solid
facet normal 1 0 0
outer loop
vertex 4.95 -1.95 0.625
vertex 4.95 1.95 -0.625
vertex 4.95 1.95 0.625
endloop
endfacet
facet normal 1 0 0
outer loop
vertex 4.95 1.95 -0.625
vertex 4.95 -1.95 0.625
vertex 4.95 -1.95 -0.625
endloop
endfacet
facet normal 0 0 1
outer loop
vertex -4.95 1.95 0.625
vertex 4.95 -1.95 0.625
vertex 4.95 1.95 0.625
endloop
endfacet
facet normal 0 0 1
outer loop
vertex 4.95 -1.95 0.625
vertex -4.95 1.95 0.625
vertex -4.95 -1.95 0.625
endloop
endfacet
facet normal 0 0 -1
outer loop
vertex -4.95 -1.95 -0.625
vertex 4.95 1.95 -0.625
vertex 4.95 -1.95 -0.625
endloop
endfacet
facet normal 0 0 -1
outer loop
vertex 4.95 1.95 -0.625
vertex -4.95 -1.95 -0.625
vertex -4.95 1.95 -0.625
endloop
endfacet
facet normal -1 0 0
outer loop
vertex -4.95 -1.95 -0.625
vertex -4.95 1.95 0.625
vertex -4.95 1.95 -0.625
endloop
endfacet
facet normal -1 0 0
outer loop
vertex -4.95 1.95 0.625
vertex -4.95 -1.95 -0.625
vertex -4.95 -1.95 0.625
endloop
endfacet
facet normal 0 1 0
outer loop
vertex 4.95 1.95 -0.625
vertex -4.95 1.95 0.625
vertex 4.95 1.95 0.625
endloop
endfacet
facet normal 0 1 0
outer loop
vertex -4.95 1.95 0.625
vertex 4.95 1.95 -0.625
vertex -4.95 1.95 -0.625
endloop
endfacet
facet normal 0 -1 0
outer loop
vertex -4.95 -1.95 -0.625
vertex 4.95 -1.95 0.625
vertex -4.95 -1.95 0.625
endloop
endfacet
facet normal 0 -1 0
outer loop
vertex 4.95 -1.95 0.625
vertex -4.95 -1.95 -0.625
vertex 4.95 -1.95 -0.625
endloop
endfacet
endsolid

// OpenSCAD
// Parameters
body_length = 9.9; //[5:20:0.1]
body_width = 3.9; //[2:8:0.1]
body_height = 1.25; //[0.6:2.5:0.05]
overlap = 0.8; //[0.5:2:0.1]
placeholder_thickness = 0.01; //[0.001:0.1:0.001]

// SMD Package
module smd_body() {
  color([0.85, 0.85, 0.8]) // Off-white for SMD body
  cube([body_length, body_width, body_height], center=true);
}

module pin_1_mark() {
  color([0.7, 0.7, 0.7]) // Light gray for marking
  translate([0, 0, body_height/2 - placeholder_thickness/2])
    cube([body_length, body_width, placeholder_thickness], center=true);
}

module top_marking() {
  color([0.7, 0.7, 0.7]) // Light gray for marking
  translate([0, 0, body_height/2 - placeholder_thickness/2])
    cube([body_length, body_width, placeholder_thickness], center=true);
}

module edge_chamfer() {
  color([0.7, 0.7, 0.7]) // Light gray for chamfer
  cube([body_length, body_width, placeholder_thickness], center=true);
}

module terminal_metallization() {
  color([0.5, 0.5, 0.5]) // Darker gray for metallization
  translate([0, 0, -body_height/2 + placeholder_thickness/2])
    cube([body_length, body_width, placeholder_thickness], center=true);
}

// Complete SMD Package
module smd_complete() {
  union() {
    smd_body();
    pin_1_mark();
    top_marking();
    edge_chamfer();
    terminal_metallization();
  }
}

// Render the final SMD package
smd_complete();
